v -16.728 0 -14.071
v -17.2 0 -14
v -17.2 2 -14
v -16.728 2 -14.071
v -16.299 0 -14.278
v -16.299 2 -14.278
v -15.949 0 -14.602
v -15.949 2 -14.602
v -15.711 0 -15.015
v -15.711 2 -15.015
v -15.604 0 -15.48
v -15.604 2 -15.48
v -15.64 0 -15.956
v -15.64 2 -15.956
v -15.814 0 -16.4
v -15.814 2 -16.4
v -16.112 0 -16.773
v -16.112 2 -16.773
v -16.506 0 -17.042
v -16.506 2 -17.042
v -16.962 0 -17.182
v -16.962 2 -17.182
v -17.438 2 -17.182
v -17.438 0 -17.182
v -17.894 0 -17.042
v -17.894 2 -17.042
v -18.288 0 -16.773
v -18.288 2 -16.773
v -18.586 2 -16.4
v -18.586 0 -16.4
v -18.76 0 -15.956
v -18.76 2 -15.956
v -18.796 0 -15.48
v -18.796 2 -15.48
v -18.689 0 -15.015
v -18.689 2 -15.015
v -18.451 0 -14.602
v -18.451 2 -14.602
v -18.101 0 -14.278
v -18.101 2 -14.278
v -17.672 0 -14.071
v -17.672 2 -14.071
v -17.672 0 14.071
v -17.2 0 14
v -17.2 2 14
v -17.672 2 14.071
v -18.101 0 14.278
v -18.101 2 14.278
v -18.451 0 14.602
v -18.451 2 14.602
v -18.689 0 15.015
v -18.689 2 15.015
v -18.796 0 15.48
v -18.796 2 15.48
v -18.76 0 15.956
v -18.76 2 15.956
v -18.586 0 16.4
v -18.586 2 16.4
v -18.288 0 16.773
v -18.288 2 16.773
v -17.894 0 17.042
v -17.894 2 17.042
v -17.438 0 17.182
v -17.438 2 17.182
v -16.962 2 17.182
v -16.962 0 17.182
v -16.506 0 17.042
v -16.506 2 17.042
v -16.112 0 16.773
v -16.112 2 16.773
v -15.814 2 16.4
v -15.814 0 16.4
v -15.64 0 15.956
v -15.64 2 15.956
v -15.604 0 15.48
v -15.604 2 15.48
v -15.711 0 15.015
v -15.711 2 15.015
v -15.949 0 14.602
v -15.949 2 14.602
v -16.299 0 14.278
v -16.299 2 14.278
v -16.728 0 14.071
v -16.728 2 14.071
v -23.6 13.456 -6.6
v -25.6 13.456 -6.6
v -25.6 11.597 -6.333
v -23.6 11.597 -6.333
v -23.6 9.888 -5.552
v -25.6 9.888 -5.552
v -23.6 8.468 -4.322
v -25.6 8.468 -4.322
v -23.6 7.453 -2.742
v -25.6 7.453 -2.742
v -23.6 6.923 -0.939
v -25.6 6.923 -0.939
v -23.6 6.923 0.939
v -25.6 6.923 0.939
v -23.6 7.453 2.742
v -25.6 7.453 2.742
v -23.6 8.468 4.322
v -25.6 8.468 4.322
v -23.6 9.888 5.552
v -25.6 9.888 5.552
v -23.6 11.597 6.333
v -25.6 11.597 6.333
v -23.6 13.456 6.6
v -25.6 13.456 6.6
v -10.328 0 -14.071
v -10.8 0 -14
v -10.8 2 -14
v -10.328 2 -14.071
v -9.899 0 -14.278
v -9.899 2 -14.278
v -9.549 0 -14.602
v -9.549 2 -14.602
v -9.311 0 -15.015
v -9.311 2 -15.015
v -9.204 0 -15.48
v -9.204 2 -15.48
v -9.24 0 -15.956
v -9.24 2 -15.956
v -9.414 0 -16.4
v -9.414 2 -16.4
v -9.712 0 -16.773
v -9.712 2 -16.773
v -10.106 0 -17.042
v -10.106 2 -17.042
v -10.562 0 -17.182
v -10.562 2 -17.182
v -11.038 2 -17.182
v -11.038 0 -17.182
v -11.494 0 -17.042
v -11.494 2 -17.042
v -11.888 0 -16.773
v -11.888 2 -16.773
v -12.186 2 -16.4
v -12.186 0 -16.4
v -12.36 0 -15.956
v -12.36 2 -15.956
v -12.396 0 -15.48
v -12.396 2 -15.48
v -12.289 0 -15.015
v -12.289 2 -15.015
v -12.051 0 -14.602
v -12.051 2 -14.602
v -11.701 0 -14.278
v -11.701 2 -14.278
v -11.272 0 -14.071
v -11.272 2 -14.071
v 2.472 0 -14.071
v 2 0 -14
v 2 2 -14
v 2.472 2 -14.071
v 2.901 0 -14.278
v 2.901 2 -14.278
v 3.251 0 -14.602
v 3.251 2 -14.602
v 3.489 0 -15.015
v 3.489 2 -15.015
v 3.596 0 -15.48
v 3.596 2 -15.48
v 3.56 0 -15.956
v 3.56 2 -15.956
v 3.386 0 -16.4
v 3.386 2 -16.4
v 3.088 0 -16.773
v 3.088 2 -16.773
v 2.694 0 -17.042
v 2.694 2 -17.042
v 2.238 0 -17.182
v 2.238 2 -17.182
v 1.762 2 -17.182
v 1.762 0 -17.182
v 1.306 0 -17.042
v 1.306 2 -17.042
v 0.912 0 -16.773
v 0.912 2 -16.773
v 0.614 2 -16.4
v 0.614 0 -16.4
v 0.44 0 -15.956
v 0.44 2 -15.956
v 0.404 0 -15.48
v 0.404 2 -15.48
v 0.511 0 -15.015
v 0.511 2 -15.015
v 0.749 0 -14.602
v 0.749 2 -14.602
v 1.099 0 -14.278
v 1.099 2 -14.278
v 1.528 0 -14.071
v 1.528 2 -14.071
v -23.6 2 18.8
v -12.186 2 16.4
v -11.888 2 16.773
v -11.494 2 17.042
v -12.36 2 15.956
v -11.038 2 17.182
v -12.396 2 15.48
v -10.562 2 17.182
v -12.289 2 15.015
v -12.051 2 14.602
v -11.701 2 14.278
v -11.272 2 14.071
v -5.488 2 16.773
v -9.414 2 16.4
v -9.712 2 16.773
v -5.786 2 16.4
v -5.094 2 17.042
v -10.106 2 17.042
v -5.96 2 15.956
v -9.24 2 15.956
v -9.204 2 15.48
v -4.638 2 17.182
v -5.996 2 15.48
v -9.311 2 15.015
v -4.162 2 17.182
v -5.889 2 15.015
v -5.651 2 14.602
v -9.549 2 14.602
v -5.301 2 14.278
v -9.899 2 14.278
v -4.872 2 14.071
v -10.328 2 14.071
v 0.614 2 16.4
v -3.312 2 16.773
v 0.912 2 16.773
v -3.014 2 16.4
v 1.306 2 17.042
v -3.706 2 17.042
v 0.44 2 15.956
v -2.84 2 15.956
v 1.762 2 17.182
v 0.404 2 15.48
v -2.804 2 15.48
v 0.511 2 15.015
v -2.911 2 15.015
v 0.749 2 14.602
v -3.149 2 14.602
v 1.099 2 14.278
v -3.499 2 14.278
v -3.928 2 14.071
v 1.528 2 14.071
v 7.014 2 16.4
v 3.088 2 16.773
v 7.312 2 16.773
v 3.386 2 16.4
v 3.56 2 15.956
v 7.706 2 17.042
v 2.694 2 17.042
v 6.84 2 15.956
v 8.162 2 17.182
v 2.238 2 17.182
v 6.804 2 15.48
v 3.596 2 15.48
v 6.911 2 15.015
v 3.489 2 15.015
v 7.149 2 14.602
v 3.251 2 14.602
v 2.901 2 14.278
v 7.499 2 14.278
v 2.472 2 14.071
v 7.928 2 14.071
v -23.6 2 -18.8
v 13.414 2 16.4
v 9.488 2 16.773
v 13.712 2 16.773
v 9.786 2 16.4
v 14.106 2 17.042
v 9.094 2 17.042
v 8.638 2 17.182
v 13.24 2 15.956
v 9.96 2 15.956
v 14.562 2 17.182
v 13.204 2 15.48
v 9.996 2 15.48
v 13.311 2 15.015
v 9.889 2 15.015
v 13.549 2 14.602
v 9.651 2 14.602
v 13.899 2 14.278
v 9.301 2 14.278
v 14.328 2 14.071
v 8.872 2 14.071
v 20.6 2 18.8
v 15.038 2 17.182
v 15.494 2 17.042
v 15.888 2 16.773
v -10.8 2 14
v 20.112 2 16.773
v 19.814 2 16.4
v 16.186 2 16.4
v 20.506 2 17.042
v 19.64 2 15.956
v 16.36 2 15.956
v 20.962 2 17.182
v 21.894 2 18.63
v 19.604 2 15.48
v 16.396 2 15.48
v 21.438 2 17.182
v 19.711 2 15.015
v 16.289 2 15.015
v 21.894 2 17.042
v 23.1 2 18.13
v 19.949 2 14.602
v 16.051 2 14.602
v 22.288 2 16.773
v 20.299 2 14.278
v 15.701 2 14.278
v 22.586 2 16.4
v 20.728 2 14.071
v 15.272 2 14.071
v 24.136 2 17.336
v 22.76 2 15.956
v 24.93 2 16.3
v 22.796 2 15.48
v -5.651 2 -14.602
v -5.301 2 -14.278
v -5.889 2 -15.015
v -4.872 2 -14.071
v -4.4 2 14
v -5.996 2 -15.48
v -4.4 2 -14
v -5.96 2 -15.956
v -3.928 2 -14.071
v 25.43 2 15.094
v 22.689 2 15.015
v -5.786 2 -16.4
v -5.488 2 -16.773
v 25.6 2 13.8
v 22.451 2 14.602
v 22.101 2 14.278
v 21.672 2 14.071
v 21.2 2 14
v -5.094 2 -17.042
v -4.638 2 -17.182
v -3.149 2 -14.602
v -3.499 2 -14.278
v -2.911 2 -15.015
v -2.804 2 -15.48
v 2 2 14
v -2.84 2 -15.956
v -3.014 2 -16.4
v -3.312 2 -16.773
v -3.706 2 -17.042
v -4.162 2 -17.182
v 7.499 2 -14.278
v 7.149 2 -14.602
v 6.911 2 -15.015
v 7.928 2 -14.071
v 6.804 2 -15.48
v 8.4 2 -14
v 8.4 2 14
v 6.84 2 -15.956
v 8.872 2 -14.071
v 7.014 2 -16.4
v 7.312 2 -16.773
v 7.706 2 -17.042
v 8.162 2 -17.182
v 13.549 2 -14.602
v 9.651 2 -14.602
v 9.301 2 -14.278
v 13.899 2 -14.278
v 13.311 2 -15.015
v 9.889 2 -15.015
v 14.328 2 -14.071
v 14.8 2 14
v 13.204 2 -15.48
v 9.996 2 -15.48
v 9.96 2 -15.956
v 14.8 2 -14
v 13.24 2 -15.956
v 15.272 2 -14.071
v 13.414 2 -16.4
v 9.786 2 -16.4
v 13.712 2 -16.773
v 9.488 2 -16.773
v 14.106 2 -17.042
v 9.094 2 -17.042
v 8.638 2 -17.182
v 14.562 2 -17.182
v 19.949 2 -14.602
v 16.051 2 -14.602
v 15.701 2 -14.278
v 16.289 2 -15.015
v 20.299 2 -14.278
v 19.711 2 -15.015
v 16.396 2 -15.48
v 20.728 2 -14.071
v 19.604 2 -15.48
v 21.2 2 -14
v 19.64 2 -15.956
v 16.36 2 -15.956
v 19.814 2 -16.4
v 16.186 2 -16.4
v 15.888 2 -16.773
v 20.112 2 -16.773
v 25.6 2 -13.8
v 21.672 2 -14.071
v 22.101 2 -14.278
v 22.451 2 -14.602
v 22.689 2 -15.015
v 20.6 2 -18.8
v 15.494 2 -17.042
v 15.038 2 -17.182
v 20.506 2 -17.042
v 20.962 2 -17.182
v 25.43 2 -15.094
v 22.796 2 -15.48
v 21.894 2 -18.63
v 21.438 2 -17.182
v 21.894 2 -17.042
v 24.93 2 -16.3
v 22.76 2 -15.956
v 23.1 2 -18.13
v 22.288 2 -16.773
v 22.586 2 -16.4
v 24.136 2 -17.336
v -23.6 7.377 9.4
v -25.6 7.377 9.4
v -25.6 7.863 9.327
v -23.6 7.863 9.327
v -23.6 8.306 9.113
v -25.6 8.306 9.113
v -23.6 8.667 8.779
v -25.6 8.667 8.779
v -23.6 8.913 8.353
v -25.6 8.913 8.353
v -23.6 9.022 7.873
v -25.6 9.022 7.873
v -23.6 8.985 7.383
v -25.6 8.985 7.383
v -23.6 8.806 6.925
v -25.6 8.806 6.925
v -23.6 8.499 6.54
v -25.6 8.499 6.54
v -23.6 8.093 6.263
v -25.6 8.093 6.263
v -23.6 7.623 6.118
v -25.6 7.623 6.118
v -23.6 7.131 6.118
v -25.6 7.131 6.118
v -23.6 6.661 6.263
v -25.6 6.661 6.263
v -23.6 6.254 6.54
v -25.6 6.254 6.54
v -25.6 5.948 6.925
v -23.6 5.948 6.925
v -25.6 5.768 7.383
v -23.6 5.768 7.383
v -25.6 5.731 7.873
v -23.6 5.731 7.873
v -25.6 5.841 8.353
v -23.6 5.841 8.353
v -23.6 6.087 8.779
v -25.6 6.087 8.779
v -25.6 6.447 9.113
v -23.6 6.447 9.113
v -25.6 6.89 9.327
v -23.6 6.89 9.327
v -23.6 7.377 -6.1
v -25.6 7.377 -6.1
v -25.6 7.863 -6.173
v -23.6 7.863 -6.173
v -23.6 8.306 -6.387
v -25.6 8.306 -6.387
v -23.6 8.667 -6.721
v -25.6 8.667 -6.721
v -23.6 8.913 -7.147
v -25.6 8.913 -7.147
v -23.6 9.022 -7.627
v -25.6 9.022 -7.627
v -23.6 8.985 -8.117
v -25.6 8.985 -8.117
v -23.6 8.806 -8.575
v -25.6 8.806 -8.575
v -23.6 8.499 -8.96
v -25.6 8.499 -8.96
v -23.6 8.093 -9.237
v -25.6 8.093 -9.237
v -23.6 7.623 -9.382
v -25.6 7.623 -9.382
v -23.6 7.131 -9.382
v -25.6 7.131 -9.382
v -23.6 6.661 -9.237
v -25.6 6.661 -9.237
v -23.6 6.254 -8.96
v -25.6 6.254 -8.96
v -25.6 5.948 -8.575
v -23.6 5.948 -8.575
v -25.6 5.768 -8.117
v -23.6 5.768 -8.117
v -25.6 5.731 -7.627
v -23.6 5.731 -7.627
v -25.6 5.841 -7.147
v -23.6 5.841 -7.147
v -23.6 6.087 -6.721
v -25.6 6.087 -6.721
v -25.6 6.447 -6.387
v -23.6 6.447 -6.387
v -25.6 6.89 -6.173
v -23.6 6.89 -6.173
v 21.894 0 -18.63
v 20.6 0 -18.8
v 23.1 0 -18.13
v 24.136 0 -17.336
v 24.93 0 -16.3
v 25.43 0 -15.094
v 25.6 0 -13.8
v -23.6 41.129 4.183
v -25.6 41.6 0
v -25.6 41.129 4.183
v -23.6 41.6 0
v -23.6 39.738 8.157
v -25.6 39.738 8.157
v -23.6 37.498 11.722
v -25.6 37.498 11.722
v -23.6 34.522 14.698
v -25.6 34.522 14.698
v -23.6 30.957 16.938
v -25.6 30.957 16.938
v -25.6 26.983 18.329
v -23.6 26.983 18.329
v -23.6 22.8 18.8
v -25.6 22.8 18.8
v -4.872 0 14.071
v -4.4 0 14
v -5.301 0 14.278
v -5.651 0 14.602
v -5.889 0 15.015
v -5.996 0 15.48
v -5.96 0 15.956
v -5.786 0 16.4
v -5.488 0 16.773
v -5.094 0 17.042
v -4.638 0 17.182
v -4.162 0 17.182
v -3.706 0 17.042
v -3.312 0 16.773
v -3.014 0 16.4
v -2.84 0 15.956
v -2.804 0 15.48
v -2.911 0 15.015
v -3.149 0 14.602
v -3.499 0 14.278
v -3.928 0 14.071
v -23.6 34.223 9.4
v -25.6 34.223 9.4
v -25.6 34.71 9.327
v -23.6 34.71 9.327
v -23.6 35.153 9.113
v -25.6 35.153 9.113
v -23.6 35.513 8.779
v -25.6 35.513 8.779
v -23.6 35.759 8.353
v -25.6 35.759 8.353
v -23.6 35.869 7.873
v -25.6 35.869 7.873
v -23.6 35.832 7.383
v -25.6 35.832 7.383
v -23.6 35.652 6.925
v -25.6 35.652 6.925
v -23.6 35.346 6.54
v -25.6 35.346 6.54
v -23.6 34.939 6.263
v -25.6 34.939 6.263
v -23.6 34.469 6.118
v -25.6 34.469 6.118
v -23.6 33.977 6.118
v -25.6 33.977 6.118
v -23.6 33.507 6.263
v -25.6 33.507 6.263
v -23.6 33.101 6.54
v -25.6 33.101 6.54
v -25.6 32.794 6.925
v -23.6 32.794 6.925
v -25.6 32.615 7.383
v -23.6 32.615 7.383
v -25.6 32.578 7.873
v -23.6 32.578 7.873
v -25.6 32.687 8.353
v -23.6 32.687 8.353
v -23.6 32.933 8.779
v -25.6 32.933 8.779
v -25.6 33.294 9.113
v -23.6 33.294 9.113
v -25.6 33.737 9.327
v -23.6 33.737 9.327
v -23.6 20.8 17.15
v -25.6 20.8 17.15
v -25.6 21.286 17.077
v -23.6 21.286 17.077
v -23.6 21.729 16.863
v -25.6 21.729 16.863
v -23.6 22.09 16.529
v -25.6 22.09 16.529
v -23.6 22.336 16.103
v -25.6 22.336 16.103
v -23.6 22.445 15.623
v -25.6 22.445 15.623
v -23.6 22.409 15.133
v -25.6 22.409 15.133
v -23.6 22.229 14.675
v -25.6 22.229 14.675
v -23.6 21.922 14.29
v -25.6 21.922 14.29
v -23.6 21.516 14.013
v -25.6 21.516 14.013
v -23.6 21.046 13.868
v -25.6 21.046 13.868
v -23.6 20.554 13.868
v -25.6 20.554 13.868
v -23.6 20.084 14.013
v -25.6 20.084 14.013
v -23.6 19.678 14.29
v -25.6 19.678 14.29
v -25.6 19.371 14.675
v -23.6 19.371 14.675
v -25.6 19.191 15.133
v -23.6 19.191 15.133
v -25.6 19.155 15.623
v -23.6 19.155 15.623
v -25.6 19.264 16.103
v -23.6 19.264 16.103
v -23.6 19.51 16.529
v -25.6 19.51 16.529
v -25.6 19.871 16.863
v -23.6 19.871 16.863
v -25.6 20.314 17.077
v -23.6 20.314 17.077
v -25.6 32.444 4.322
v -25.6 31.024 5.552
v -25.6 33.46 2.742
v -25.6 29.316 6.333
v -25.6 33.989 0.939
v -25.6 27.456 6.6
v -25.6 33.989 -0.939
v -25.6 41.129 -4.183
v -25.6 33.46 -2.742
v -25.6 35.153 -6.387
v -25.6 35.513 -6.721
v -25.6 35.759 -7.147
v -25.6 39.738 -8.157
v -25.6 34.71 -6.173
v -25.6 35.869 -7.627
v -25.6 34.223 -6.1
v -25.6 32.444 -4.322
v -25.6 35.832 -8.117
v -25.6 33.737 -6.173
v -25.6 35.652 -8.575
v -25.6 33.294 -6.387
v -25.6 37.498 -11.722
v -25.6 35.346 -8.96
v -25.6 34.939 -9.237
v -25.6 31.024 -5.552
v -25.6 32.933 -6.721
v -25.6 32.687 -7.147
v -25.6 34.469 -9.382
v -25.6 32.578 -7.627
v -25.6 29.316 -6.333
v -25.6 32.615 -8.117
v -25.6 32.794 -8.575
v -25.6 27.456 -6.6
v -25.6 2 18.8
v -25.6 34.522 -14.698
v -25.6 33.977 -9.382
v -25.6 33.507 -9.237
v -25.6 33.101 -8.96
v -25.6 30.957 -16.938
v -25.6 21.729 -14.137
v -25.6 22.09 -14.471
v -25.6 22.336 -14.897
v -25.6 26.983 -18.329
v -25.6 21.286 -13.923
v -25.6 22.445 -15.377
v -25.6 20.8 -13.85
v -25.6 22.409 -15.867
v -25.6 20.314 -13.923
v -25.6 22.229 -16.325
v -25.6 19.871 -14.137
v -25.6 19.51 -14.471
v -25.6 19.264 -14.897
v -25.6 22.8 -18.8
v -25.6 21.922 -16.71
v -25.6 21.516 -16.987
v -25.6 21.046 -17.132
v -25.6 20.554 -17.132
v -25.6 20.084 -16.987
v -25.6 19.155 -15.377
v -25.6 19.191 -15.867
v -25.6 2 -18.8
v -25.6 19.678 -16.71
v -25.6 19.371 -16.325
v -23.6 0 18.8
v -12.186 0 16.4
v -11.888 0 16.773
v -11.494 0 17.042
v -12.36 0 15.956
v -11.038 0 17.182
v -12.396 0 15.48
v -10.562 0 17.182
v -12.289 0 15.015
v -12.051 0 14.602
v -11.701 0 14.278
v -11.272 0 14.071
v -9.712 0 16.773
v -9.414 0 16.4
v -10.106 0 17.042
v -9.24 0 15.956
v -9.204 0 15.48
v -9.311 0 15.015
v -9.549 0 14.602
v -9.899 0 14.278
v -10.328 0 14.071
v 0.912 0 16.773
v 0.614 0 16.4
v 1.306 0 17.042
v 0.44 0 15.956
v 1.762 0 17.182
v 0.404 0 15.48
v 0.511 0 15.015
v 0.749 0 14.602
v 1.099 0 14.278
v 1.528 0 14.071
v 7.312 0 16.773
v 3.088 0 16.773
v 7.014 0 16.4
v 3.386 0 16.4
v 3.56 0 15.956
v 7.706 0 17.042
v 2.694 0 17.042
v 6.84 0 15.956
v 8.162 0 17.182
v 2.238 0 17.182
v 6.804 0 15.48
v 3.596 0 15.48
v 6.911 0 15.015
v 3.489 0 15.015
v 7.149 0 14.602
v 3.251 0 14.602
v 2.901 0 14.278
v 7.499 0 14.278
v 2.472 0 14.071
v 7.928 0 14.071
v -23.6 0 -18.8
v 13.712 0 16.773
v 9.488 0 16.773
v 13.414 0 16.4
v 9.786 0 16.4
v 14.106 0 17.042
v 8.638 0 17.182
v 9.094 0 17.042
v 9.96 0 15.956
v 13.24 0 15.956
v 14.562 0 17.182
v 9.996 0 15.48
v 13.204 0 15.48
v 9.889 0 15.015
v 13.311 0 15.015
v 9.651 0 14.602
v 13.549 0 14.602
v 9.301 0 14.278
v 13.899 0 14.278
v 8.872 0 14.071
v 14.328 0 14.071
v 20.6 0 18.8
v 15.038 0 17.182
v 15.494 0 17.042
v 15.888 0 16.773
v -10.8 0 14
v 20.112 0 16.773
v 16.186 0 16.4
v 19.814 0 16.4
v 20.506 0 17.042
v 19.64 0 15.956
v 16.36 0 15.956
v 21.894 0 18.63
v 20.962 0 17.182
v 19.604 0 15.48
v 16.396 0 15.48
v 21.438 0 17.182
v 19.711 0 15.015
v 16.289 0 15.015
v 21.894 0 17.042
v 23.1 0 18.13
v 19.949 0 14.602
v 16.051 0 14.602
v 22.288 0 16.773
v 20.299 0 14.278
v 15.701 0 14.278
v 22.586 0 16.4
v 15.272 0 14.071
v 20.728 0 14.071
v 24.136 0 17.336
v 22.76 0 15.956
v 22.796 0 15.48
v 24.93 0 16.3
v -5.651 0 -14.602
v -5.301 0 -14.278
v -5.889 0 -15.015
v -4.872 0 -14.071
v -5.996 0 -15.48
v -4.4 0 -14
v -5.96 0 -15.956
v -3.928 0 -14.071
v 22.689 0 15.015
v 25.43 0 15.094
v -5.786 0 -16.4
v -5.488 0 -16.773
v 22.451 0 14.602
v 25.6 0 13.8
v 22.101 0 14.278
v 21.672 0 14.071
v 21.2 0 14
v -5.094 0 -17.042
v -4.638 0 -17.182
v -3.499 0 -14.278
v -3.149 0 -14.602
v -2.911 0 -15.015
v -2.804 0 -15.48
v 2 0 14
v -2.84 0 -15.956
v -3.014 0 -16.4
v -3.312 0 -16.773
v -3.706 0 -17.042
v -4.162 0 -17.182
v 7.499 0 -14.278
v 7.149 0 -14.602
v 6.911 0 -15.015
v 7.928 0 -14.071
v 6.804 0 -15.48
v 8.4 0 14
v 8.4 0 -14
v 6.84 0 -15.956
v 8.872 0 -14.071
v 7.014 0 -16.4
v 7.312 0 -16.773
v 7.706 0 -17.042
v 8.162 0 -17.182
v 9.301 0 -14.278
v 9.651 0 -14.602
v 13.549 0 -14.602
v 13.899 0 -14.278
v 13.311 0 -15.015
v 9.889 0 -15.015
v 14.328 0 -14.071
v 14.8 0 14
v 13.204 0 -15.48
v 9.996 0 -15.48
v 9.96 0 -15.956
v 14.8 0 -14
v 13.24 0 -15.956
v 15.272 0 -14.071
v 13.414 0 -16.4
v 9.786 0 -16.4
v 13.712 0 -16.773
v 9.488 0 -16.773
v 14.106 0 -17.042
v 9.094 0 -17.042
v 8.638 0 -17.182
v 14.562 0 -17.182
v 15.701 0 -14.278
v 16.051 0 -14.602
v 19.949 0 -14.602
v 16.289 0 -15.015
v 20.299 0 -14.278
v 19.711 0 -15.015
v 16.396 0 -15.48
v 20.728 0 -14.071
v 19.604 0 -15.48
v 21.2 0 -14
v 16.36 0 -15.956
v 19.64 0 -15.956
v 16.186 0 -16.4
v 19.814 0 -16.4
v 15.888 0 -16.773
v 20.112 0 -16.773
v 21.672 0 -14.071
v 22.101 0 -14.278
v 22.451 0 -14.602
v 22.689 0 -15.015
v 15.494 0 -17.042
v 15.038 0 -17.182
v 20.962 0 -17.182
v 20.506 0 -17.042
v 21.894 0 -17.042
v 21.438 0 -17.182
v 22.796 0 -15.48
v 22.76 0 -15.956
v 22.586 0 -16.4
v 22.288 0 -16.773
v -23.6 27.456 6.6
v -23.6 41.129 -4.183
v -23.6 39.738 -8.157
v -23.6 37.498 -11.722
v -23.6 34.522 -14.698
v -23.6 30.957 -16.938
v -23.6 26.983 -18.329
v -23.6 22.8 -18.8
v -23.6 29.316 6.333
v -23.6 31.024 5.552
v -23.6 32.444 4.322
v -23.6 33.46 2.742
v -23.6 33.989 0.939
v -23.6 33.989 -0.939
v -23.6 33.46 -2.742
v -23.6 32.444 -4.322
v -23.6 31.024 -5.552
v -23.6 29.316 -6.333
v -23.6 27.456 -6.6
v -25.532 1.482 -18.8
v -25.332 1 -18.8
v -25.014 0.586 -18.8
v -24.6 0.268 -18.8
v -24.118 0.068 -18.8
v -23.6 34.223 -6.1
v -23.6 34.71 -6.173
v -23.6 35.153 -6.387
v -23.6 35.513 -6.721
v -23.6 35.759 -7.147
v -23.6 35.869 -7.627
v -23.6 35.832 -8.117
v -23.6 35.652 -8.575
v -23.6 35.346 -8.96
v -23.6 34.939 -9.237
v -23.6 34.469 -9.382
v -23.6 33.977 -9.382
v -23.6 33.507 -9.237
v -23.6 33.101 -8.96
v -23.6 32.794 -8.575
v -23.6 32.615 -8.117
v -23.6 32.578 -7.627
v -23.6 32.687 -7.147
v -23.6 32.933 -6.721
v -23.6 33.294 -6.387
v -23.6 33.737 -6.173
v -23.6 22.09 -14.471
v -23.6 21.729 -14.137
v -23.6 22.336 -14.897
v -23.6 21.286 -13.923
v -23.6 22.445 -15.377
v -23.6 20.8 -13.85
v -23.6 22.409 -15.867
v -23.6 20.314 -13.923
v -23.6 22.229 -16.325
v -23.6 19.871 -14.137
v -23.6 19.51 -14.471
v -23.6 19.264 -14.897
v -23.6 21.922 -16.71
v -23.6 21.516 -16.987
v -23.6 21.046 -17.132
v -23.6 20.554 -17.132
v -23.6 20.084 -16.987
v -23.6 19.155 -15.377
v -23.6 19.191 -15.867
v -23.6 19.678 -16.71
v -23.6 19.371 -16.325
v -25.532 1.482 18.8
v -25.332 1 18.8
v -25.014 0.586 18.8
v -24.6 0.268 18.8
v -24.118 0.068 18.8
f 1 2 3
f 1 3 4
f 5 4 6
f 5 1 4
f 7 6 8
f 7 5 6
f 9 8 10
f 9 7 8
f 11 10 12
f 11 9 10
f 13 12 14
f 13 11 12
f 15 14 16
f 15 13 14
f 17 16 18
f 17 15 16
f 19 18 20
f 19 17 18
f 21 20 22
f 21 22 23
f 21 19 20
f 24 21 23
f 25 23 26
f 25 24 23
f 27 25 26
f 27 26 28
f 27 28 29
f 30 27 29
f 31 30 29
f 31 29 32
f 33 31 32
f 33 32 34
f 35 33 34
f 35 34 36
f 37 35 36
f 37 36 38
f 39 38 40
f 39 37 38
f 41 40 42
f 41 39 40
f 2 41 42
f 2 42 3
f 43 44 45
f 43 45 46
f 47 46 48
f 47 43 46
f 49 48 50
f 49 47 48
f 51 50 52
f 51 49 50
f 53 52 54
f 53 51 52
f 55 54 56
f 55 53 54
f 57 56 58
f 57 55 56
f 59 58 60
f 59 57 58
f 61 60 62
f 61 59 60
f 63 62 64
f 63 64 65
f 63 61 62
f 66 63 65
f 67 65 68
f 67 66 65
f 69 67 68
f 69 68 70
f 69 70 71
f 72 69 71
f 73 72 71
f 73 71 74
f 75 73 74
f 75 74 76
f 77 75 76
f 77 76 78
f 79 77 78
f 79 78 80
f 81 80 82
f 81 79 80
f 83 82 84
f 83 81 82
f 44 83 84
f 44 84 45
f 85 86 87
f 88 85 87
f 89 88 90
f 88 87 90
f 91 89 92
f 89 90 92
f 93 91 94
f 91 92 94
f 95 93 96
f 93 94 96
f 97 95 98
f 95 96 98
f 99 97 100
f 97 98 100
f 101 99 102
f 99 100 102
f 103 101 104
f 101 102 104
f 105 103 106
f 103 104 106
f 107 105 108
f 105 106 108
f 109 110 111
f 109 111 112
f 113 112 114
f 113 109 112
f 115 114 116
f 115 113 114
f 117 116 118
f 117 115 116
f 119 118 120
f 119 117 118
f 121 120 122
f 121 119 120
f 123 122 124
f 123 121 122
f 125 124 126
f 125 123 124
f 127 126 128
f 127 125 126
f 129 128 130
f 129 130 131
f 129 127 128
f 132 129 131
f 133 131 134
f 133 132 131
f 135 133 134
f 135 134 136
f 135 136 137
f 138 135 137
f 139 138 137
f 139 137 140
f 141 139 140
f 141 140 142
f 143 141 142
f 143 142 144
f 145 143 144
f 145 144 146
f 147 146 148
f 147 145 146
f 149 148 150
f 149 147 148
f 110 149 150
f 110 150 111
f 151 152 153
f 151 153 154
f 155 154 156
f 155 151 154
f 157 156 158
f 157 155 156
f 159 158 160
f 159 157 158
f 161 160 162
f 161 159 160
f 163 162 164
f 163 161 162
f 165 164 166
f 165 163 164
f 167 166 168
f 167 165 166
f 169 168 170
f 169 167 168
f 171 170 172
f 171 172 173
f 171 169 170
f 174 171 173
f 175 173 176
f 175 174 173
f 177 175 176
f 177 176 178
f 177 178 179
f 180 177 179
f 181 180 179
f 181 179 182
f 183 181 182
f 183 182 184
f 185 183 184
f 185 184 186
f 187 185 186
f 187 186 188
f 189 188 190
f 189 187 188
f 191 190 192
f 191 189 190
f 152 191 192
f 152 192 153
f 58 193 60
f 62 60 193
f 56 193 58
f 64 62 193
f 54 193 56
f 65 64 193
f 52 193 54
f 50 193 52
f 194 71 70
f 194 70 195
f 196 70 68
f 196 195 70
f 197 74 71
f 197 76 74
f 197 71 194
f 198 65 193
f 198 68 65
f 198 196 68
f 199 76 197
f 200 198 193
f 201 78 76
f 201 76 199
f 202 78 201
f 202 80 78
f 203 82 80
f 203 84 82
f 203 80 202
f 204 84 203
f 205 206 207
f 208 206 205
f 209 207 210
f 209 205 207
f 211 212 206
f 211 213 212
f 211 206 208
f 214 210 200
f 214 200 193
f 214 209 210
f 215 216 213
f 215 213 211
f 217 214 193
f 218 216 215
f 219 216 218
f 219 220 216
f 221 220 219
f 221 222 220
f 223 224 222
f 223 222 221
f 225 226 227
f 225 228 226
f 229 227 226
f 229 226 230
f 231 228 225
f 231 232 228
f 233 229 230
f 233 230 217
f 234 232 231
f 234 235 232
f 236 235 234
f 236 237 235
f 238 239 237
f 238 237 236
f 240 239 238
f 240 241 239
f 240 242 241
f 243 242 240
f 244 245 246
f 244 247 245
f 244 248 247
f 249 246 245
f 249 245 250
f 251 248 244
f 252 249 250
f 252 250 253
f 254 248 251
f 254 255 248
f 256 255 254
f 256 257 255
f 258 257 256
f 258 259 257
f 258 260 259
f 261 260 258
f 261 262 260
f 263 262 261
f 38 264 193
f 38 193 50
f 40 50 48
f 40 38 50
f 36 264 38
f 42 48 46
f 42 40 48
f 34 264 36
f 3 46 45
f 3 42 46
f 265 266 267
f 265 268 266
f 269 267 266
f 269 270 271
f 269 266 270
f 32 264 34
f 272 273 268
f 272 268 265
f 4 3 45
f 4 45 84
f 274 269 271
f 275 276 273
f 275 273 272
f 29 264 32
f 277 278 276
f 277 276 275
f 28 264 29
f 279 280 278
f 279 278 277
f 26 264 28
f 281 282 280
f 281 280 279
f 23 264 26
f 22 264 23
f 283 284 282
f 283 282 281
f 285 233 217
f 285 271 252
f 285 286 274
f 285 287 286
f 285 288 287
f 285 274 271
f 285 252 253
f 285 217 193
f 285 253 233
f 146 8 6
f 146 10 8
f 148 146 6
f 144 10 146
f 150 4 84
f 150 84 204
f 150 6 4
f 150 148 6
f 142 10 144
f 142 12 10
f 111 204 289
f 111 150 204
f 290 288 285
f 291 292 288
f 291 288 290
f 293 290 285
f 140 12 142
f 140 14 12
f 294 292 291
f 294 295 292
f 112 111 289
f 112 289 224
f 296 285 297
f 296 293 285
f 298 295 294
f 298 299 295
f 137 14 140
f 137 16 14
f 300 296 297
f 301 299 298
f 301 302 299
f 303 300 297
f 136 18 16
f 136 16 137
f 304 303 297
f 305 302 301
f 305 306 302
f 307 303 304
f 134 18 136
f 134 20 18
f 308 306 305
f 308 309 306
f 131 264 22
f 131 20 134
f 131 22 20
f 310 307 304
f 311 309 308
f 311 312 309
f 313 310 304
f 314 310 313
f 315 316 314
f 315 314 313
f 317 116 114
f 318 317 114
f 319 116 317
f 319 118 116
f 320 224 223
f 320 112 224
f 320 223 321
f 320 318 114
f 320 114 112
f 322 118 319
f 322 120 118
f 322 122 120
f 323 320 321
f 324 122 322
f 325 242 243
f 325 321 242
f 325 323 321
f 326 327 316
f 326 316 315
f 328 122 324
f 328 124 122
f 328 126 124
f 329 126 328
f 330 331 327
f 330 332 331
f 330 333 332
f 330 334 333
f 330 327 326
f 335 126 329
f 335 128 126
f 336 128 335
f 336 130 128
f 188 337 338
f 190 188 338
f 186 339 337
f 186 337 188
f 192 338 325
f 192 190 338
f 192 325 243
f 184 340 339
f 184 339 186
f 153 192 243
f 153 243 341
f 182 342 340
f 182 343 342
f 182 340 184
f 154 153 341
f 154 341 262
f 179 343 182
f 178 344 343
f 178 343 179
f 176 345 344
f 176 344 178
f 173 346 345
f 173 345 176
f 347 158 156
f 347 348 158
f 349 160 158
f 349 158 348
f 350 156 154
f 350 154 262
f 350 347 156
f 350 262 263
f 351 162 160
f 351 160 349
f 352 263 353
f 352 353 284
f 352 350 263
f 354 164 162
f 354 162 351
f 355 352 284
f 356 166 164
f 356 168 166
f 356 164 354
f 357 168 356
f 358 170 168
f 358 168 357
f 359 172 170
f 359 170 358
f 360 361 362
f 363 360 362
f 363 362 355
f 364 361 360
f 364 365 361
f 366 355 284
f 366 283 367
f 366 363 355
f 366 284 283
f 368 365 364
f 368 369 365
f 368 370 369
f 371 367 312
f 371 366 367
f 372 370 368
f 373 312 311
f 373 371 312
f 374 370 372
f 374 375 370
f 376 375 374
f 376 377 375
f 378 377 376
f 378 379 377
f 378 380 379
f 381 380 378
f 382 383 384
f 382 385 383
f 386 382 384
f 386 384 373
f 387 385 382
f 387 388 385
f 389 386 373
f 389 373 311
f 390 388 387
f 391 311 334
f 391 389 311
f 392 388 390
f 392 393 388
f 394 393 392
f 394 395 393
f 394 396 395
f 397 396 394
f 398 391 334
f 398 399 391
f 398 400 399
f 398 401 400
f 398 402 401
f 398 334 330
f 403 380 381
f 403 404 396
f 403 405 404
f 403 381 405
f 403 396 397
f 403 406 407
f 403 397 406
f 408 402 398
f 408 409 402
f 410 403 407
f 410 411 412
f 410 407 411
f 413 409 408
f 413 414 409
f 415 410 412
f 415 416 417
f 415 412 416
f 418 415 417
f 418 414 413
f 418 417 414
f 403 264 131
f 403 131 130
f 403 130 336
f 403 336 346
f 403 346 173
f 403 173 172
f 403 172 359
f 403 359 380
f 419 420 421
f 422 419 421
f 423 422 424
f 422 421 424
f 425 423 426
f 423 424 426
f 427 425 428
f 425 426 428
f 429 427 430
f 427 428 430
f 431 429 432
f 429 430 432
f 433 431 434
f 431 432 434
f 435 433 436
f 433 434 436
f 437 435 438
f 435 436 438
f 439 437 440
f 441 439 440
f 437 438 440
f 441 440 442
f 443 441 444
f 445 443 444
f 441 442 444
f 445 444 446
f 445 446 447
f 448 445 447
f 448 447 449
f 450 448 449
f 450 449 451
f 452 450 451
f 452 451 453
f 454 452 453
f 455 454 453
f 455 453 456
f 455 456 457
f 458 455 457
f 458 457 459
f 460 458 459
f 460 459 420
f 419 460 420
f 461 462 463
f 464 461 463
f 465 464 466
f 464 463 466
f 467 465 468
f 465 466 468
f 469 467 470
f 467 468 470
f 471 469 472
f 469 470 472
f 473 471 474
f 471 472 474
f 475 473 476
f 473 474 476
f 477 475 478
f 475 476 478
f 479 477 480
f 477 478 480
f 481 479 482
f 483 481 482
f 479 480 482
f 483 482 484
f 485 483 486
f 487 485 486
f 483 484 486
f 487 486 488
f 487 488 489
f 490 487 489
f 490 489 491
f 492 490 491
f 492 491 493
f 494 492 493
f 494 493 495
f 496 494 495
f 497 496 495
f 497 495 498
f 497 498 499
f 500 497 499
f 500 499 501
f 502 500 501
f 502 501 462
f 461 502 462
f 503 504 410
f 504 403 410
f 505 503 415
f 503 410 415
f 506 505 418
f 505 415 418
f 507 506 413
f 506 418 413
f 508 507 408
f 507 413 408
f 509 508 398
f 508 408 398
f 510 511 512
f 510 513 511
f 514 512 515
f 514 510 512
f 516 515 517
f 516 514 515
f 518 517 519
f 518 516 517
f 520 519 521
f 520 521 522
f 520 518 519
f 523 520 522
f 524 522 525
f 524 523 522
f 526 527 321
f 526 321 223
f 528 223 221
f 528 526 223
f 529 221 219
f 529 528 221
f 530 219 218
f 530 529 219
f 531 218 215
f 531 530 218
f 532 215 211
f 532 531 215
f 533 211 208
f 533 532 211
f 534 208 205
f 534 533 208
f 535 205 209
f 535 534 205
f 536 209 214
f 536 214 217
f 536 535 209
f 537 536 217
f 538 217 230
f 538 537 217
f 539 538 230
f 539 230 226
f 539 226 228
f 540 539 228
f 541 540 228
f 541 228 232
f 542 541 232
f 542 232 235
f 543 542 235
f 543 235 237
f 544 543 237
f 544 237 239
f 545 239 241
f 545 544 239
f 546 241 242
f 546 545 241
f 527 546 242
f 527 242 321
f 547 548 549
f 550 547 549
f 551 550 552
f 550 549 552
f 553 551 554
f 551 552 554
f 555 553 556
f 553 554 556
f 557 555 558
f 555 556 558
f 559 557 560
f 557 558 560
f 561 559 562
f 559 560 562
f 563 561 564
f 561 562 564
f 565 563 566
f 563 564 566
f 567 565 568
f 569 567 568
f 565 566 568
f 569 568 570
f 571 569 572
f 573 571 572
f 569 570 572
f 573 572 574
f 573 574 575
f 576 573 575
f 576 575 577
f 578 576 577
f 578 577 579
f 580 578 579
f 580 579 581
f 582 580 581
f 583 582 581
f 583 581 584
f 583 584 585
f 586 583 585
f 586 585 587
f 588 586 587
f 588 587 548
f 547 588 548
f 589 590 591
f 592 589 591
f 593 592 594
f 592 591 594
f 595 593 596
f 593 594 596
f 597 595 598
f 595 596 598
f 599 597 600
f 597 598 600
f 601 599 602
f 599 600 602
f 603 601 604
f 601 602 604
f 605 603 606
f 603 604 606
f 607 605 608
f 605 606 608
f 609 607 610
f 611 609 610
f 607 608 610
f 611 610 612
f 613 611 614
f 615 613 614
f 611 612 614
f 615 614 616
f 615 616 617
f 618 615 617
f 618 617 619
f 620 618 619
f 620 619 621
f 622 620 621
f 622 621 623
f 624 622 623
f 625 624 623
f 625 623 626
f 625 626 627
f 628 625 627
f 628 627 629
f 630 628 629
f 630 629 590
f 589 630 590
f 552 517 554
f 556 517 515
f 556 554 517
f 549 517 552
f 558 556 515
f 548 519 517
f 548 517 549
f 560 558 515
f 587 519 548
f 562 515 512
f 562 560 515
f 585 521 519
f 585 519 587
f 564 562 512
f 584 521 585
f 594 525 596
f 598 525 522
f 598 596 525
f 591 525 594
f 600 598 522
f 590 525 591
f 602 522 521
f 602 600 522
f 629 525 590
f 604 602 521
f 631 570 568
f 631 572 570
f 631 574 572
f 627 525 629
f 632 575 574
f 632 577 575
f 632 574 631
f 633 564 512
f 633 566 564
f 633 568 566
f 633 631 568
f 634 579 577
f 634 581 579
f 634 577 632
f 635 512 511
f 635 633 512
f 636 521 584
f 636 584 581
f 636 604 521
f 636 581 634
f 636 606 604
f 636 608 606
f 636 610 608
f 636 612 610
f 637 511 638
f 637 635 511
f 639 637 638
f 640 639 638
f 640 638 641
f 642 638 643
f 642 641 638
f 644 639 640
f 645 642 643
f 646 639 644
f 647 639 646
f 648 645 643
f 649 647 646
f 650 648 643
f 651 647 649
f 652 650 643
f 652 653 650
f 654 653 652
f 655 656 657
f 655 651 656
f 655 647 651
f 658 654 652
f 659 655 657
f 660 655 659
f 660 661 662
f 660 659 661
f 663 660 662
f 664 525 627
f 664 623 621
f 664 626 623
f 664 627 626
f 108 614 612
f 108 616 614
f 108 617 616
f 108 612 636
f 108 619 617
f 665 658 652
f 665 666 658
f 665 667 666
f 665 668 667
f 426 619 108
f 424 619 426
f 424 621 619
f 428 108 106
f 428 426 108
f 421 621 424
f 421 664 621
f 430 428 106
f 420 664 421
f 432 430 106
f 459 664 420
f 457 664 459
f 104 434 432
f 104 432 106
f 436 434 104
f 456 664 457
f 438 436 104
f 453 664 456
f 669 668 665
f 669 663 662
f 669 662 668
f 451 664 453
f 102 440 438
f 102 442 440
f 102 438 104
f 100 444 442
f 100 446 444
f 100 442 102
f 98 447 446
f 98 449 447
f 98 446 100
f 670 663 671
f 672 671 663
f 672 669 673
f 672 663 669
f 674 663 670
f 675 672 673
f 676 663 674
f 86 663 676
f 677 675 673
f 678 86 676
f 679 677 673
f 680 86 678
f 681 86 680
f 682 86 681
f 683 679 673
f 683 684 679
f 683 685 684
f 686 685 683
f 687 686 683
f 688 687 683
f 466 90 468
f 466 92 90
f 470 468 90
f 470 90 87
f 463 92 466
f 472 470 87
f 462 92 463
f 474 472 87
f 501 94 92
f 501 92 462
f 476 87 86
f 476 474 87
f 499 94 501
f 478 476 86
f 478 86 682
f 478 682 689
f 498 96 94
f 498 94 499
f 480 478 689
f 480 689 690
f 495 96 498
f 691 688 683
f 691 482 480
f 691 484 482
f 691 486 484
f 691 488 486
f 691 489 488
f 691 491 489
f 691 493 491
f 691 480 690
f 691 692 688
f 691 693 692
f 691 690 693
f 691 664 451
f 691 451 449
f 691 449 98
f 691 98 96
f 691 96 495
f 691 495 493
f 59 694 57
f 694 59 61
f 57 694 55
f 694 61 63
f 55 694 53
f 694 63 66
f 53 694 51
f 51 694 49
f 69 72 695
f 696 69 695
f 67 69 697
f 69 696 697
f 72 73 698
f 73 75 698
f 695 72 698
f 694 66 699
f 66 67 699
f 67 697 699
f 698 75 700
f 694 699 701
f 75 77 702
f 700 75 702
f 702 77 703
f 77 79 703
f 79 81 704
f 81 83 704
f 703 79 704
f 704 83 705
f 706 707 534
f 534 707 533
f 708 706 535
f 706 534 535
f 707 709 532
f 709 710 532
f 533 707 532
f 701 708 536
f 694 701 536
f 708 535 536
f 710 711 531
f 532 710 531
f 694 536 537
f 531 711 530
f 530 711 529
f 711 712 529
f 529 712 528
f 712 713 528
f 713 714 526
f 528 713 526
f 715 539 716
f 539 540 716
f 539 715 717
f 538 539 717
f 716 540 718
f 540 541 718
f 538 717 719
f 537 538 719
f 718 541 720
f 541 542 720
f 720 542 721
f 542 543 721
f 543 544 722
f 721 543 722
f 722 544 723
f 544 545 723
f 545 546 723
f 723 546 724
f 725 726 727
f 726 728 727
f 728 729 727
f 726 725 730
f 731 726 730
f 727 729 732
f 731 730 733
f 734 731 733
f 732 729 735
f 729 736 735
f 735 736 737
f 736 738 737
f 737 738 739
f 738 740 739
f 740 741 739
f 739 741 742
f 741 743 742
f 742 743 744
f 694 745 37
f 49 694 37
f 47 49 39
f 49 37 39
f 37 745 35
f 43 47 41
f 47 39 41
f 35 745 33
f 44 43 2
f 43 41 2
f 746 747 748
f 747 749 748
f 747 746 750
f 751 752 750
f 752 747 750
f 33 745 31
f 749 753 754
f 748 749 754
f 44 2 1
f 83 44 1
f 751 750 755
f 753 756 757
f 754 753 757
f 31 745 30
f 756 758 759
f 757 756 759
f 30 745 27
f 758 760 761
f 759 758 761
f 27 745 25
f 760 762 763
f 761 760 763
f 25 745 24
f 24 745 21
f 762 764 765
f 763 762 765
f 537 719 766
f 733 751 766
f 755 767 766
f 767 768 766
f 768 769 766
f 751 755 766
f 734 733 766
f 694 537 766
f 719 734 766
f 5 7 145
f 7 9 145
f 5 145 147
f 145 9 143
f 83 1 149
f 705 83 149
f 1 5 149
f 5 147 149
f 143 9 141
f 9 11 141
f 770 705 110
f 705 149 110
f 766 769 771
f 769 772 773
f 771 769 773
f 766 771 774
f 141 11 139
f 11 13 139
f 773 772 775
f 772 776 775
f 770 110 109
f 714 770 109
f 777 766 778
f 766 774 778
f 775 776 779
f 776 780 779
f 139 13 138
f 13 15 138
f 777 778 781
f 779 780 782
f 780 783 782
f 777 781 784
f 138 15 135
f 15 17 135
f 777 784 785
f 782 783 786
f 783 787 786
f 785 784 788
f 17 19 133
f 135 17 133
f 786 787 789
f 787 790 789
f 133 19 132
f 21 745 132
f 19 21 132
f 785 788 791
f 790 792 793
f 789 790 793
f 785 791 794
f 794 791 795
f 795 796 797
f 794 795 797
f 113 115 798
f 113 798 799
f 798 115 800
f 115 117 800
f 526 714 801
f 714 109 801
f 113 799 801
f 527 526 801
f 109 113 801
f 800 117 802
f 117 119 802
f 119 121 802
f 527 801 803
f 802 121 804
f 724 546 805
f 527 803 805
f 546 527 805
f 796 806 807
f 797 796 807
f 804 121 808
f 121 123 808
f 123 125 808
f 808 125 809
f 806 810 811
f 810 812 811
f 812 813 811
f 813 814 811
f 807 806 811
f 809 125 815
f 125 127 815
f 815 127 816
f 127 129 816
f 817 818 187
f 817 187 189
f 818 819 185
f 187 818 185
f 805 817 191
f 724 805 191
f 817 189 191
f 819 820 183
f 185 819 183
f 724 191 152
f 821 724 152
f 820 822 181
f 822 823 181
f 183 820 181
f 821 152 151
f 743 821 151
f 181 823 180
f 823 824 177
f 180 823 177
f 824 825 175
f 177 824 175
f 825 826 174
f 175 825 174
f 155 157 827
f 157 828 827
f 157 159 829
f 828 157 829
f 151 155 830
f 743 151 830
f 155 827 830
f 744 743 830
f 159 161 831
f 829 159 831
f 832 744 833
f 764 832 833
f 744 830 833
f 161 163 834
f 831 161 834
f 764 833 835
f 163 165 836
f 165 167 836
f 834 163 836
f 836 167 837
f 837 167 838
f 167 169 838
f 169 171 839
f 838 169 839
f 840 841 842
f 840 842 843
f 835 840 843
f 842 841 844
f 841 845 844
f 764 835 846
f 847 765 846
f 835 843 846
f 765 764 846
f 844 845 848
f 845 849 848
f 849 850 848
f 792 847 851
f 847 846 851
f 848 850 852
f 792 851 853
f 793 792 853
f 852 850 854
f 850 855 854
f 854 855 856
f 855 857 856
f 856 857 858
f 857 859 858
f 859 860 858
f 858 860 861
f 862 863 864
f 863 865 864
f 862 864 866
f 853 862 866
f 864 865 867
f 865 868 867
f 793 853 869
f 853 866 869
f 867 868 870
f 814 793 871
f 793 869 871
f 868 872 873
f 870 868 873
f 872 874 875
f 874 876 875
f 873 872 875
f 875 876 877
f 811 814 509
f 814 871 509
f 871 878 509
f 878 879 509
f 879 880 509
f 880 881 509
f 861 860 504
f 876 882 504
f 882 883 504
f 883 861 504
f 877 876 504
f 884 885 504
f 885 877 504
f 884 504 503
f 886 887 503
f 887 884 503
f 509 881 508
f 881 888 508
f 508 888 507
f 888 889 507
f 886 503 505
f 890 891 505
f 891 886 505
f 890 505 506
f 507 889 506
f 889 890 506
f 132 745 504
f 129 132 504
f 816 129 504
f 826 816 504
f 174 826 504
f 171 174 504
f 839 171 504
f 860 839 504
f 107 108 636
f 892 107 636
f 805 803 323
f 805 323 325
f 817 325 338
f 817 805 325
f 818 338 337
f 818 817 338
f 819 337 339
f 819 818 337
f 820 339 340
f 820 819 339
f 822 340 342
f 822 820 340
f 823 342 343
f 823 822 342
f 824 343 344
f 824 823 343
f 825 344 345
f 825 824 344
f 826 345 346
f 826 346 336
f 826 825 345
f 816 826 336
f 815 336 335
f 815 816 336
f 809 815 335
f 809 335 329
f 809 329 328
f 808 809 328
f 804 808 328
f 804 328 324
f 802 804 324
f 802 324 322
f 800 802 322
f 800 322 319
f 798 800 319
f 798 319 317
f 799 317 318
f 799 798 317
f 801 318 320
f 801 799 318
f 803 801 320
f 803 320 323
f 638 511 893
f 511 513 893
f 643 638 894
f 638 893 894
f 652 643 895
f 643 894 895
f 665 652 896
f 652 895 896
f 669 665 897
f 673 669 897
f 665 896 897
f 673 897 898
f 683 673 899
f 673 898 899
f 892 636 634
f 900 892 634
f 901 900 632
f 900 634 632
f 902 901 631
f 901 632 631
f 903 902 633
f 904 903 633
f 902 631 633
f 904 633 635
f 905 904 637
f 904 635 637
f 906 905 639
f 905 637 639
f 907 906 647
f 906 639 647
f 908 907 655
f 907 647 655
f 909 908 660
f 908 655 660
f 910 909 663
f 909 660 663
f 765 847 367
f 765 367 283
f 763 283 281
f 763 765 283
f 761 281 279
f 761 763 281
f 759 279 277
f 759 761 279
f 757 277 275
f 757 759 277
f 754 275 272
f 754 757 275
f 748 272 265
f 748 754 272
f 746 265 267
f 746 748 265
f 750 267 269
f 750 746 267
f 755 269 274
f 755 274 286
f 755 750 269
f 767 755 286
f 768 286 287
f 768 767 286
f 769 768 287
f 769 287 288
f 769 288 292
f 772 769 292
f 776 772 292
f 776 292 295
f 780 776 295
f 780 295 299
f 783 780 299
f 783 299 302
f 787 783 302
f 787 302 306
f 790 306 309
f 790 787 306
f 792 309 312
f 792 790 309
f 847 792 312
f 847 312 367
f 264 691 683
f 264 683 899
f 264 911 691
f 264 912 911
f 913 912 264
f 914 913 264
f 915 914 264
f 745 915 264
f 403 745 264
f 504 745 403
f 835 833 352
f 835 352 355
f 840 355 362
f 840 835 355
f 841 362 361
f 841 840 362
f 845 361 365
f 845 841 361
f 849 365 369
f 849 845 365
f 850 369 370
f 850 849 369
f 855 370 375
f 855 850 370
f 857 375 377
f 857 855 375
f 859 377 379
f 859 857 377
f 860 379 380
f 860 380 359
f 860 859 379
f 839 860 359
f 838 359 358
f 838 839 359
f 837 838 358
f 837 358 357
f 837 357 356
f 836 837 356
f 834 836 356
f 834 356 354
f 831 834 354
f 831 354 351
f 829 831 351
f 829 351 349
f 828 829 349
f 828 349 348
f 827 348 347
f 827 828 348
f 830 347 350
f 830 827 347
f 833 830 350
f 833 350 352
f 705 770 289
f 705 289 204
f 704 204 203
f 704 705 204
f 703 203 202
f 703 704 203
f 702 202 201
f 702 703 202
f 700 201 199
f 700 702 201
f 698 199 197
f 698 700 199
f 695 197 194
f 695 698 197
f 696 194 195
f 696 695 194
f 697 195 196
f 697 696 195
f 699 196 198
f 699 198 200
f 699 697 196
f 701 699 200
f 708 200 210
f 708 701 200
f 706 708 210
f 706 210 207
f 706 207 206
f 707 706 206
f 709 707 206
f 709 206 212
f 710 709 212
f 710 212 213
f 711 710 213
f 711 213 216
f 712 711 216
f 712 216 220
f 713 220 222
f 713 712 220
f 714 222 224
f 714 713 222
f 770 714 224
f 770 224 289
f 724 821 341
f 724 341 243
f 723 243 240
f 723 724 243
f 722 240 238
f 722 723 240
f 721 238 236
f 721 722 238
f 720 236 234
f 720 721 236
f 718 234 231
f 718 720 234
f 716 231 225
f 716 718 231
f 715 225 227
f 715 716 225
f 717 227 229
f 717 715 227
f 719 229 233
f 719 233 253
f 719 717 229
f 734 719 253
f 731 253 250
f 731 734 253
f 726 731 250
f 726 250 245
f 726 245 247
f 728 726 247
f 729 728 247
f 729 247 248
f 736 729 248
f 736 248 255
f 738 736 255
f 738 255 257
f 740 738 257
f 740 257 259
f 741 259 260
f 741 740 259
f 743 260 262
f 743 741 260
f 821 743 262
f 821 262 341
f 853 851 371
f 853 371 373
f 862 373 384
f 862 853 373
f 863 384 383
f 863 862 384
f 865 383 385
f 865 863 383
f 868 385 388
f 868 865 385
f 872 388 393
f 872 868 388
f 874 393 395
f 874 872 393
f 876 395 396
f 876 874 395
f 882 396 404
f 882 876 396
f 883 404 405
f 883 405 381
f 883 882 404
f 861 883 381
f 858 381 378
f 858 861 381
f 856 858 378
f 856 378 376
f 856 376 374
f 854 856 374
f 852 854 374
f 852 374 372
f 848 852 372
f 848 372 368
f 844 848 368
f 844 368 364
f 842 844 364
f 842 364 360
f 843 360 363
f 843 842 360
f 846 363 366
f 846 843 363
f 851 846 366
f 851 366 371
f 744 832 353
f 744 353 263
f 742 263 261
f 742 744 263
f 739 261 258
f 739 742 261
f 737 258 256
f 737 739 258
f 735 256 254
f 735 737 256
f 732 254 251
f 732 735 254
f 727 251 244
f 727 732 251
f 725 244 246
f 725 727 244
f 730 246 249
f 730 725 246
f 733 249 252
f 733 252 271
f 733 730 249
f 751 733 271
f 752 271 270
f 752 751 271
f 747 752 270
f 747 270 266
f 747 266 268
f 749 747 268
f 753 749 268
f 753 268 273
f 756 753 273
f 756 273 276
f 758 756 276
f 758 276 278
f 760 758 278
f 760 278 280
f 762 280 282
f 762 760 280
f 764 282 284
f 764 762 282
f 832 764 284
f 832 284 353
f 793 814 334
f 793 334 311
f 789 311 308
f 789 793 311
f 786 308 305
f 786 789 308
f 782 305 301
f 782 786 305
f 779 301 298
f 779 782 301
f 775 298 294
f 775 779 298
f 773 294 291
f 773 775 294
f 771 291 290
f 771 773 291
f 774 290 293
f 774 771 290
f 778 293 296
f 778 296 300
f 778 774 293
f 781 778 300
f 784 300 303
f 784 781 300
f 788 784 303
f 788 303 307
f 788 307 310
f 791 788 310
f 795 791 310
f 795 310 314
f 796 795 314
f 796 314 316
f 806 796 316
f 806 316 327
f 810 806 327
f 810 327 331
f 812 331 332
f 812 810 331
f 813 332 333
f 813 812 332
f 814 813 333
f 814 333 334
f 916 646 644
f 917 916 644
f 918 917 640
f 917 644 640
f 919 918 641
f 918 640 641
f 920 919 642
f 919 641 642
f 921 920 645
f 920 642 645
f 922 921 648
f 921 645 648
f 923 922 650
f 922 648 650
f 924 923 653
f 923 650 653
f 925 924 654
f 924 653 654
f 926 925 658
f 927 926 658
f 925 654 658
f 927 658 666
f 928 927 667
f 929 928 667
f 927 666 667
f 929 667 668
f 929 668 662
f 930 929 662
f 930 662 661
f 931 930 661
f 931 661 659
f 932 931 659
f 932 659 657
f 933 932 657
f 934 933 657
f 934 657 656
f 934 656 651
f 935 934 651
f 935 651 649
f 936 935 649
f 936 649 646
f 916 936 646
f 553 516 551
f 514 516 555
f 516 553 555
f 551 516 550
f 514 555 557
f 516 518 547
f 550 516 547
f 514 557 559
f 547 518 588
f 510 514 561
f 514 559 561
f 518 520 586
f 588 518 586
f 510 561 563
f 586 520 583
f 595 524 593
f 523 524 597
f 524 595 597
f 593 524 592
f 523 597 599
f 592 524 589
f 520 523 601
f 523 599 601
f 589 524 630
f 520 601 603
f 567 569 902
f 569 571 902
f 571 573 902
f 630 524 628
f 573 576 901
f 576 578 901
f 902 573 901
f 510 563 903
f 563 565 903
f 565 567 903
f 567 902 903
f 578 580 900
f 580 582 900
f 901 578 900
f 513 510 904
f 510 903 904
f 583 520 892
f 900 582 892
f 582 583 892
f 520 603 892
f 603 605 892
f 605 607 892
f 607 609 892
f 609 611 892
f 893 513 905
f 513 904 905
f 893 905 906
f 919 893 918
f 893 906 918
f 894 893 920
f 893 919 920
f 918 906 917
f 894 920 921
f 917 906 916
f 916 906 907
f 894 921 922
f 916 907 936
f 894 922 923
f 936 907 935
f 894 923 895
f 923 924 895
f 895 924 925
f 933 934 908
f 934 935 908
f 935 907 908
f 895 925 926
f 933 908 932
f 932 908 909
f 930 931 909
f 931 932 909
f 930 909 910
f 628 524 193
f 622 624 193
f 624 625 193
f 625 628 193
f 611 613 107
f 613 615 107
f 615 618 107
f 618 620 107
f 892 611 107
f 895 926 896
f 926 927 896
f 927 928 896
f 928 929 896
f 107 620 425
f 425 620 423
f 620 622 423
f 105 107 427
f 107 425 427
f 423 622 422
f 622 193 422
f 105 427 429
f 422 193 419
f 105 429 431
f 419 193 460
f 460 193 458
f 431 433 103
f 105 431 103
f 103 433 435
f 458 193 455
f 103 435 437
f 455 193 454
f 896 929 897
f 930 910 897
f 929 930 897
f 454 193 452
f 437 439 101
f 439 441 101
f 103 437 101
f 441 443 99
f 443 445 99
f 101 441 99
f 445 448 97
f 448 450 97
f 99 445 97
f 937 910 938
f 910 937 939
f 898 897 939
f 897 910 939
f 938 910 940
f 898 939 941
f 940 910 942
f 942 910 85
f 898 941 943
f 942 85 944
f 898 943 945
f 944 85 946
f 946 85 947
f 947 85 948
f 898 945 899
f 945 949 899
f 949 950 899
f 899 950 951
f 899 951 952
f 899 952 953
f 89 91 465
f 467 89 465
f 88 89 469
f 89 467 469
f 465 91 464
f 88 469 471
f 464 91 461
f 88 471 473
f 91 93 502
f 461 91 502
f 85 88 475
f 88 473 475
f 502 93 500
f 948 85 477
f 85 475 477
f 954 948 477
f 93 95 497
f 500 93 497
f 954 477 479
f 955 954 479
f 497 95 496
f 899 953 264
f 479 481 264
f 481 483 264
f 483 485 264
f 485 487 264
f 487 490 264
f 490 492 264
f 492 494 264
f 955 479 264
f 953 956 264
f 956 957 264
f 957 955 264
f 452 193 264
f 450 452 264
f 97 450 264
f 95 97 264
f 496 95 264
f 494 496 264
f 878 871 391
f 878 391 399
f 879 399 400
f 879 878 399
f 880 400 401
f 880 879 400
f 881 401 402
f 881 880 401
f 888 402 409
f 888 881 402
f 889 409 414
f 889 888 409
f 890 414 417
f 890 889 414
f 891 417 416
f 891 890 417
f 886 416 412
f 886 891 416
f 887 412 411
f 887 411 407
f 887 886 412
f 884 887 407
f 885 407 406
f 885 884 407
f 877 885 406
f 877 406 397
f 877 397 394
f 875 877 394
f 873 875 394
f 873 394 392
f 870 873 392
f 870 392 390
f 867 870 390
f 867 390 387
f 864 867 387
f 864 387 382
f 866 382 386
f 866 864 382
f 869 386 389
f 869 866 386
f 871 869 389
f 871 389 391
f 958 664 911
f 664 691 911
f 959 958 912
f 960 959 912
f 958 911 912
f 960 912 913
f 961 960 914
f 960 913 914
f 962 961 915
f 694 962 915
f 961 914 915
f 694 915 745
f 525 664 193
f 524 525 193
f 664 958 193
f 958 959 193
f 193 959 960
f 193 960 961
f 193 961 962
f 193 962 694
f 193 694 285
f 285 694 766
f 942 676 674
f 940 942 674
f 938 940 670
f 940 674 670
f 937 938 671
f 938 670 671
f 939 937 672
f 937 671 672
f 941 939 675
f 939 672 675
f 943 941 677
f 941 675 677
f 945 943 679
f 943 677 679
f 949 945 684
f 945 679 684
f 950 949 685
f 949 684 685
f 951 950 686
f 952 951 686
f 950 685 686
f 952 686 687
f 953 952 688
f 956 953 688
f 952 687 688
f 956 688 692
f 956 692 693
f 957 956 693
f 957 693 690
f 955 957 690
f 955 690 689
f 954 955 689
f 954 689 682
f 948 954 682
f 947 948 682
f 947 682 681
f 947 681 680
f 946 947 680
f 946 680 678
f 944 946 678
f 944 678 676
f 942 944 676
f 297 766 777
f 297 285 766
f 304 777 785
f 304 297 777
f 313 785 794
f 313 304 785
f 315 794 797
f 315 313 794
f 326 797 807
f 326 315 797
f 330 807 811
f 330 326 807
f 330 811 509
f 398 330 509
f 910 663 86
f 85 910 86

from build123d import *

# Parameters (mm, degrees)
SKETCH1_W           = 51.2
SKETCH1_H           = 37.6
SKETCH1_R           = 1.6
BOSS_EXTRUDE1_DEPTH = 2
FILLET2_R           = 5
SKETCH2_W           = 2
SKETCH2_H           = 37.6
BOSS_EXTRUDE2_DEPTH = 39.6
CUT_EXTRUDE1_REACH  = 70.596
SKETCH3_R           = 1.65
FILLET3_R           = 18.8
FILLET4_R           = 2


with BuildPart() as part:
    # Sketch1 → Boss-Extrude1 (new body)
    with BuildSketch(Plane(origin=(0, 0, 0), x_dir=(1, 0, 0), z_dir=(0, 1, 0))):
        Rectangle(SKETCH1_W, SKETCH1_H)
        with Locations(Location((-17.2, 15.6, 0), (0, 0, 270))):
            Circle(SKETCH1_R, mode=Mode.SUBTRACT)
        with Locations(Location((-10.8, 15.6, 0), (0, 0, 270))):
            Circle(SKETCH1_R, mode=Mode.SUBTRACT)
        with Locations(Location((-4.4, 15.6, 0), (0, 0, 270))):
            Circle(SKETCH1_R, mode=Mode.SUBTRACT)
        with Locations(Location((2, 15.6, 0), (0, 0, 270))):
            Circle(SKETCH1_R, mode=Mode.SUBTRACT)
        with Locations(Location((8.4, 15.6, 0), (0, 0, 270))):
            Circle(SKETCH1_R, mode=Mode.SUBTRACT)
        with Locations(Location((14.8, 15.6, 0), (0, 0, 270))):
            Circle(SKETCH1_R, mode=Mode.SUBTRACT)
        with Locations(Location((21.2, 15.6, 0), (0, 0, 270))):
            Circle(SKETCH1_R, mode=Mode.SUBTRACT)
        with Locations(Location((21.2, -15.6, 0), (0, 0, 90))):
            Circle(SKETCH1_R, mode=Mode.SUBTRACT)
        with Locations(Location((14.8, -15.6, 0), (0, 0, 90))):
            Circle(SKETCH1_R, mode=Mode.SUBTRACT)
        with Locations(Location((8.4, -15.6, 0), (0, 0, 90))):
            Circle(SKETCH1_R, mode=Mode.SUBTRACT)
        with Locations(Location((2, -15.6, 0), (0, 0, 90))):
            Circle(SKETCH1_R, mode=Mode.SUBTRACT)
        with Locations(Location((-4.4, -15.6, 0), (0, 0, 90))):
            Circle(SKETCH1_R, mode=Mode.SUBTRACT)
        with Locations(Location((-10.8, -15.6, 0), (0, 0, 90))):
            Circle(SKETCH1_R, mode=Mode.SUBTRACT)
        with Locations(Location((-17.2, -15.6, 0), (0, 0, 90))):
            Circle(SKETCH1_R, mode=Mode.SUBTRACT)
    extrude(amount=BOSS_EXTRUDE1_DEPTH)

    # Fillet2
    fillet2_edges = [part.edges().sort_by_distance(p)[0] for p in [
        (25.6, 1, 18.8),
        (25.6, 1, -18.8),
    ]]
    fillet(fillet2_edges, radius=FILLET2_R)

    # Sketch2 → Boss-Extrude2 (add)
    with BuildSketch(Plane(origin=(0, 2, 0), x_dir=(1, 0, 0), z_dir=(0, 1, 0))):
        with Locations((-24.6, 0)):
            Rectangle(SKETCH2_W, SKETCH2_H)
    extrude(amount=BOSS_EXTRUDE2_DEPTH)

    # Sketch3 → Cut-Extrude1 (cut, up to next)
    with BuildSketch(Plane.ZY.offset(25.6), mode=Mode.PRIVATE) as cut_extrude1_sk1:
        with Locations((7.75, 34.223393759)):
            Circle(SKETCH3_R)
    cut_extrude1_tool1 = extrude(cut_extrude1_sk1.sketch, amount=-CUT_EXTRUDE1_REACH, mode=Mode.PRIVATE) & part.part
    # Sketch3 → Cut-Extrude1 (cut, up to next)
    with BuildSketch(Plane.ZY.offset(25.6), mode=Mode.PRIVATE) as cut_extrude1_sk2:
        with Locations((15.5, 20.8)):
            Circle(SKETCH3_R)
    cut_extrude1_tool2 = extrude(cut_extrude1_sk2.sketch, amount=-CUT_EXTRUDE1_REACH, mode=Mode.PRIVATE) & part.part
    # Sketch3 → Cut-Extrude1 (cut, up to next)
    with BuildSketch(Plane.ZY.offset(25.6), mode=Mode.PRIVATE) as cut_extrude1_sk3:
        with Locations((7.75, 7.376606241)):
            Circle(SKETCH3_R)
    cut_extrude1_tool3 = extrude(cut_extrude1_sk3.sketch, amount=-CUT_EXTRUDE1_REACH, mode=Mode.PRIVATE) & part.part
    # Sketch3 → Cut-Extrude1 (cut, up to next)
    with BuildSketch(Plane.ZY.offset(25.6), mode=Mode.PRIVATE) as cut_extrude1_sk4:
        with Locations((-7.75, 7.376606241)):
            Circle(SKETCH3_R)
    cut_extrude1_tool4 = extrude(cut_extrude1_sk4.sketch, amount=-CUT_EXTRUDE1_REACH, mode=Mode.PRIVATE) & part.part
    # Sketch3 → Cut-Extrude1 (cut, up to next)
    with BuildSketch(Plane.ZY.offset(25.6), mode=Mode.PRIVATE) as cut_extrude1_sk5:
        with Locations((-15.5, 20.8)):
            Circle(SKETCH3_R)
    cut_extrude1_tool5 = extrude(cut_extrude1_sk5.sketch, amount=-CUT_EXTRUDE1_REACH, mode=Mode.PRIVATE) & part.part
    # Sketch3 → Cut-Extrude1 (cut, up to next)
    with BuildSketch(Plane.ZY.offset(25.6), mode=Mode.PRIVATE) as cut_extrude1_sk6:
        with Locations((-7.75, 34.223393759)):
            Circle(SKETCH3_R)
    cut_extrude1_tool6 = extrude(cut_extrude1_sk6.sketch, amount=-CUT_EXTRUDE1_REACH, mode=Mode.PRIVATE) & part.part
    # Sketch3 → Cut-Extrude1 (cut, up to next)
    with BuildSketch(Plane.ZY.offset(25.6), mode=Mode.PRIVATE) as cut_extrude1_sk7:
        with BuildLine():
            Line((-6.6, 27.456121665), (-6.6, 13.456121665))
            ThreePointArc((-6.6, 13.456121665), (0, 6.856121665), (6.6, 13.456121665))
            Line((6.6, 13.456121665), (6.6, 27.456121665))
            ThreePointArc((6.6, 27.456121665), (0, 34.056121665), (-6.6, 27.456121665))
        make_face()
    cut_extrude1_tool7 = extrude(cut_extrude1_sk7.sketch, amount=-CUT_EXTRUDE1_REACH, mode=Mode.PRIVATE) & part.part
    add(cut_extrude1_tool1.solids().sort_by_distance((-25.6, 34.223394, 7.75))[0], mode=Mode.SUBTRACT)
    add(cut_extrude1_tool2.solids().sort_by_distance((-25.6, 20.8, 15.5))[0], mode=Mode.SUBTRACT)
    add(cut_extrude1_tool3.solids().sort_by_distance((-25.6, 7.376606, 7.75))[0], mode=Mode.SUBTRACT)
    add(cut_extrude1_tool4.solids().sort_by_distance((-25.6, 7.376606, -7.75))[0], mode=Mode.SUBTRACT)
    add(cut_extrude1_tool5.solids().sort_by_distance((-25.6, 20.8, -15.5))[0], mode=Mode.SUBTRACT)
    add(cut_extrude1_tool6.solids().sort_by_distance((-25.6, 34.223394, -7.75))[0], mode=Mode.SUBTRACT)
    add(cut_extrude1_tool7.solids().sort_by_distance((-25.6, 20.456122, 0))[0], mode=Mode.SUBTRACT)

    # Fillet3
    fillet3_edges = [part.edges().sort_by_distance(p)[0] for p in [
        (-24.6, 41.6, -18.8),
        (-24.6, 41.6, 18.8),
    ]]
    fillet(fillet3_edges, radius=FILLET3_R - 0.0001)  # a hair under: the kernel refuses the full size

    # Fillet4
    fillet4_edges = [part.edges().sort_by_distance(p)[0] for p in [
        (-25.6, 0, 0),
    ]]
    fillet(fillet4_edges, radius=FILLET4_R)


solid = part.part
